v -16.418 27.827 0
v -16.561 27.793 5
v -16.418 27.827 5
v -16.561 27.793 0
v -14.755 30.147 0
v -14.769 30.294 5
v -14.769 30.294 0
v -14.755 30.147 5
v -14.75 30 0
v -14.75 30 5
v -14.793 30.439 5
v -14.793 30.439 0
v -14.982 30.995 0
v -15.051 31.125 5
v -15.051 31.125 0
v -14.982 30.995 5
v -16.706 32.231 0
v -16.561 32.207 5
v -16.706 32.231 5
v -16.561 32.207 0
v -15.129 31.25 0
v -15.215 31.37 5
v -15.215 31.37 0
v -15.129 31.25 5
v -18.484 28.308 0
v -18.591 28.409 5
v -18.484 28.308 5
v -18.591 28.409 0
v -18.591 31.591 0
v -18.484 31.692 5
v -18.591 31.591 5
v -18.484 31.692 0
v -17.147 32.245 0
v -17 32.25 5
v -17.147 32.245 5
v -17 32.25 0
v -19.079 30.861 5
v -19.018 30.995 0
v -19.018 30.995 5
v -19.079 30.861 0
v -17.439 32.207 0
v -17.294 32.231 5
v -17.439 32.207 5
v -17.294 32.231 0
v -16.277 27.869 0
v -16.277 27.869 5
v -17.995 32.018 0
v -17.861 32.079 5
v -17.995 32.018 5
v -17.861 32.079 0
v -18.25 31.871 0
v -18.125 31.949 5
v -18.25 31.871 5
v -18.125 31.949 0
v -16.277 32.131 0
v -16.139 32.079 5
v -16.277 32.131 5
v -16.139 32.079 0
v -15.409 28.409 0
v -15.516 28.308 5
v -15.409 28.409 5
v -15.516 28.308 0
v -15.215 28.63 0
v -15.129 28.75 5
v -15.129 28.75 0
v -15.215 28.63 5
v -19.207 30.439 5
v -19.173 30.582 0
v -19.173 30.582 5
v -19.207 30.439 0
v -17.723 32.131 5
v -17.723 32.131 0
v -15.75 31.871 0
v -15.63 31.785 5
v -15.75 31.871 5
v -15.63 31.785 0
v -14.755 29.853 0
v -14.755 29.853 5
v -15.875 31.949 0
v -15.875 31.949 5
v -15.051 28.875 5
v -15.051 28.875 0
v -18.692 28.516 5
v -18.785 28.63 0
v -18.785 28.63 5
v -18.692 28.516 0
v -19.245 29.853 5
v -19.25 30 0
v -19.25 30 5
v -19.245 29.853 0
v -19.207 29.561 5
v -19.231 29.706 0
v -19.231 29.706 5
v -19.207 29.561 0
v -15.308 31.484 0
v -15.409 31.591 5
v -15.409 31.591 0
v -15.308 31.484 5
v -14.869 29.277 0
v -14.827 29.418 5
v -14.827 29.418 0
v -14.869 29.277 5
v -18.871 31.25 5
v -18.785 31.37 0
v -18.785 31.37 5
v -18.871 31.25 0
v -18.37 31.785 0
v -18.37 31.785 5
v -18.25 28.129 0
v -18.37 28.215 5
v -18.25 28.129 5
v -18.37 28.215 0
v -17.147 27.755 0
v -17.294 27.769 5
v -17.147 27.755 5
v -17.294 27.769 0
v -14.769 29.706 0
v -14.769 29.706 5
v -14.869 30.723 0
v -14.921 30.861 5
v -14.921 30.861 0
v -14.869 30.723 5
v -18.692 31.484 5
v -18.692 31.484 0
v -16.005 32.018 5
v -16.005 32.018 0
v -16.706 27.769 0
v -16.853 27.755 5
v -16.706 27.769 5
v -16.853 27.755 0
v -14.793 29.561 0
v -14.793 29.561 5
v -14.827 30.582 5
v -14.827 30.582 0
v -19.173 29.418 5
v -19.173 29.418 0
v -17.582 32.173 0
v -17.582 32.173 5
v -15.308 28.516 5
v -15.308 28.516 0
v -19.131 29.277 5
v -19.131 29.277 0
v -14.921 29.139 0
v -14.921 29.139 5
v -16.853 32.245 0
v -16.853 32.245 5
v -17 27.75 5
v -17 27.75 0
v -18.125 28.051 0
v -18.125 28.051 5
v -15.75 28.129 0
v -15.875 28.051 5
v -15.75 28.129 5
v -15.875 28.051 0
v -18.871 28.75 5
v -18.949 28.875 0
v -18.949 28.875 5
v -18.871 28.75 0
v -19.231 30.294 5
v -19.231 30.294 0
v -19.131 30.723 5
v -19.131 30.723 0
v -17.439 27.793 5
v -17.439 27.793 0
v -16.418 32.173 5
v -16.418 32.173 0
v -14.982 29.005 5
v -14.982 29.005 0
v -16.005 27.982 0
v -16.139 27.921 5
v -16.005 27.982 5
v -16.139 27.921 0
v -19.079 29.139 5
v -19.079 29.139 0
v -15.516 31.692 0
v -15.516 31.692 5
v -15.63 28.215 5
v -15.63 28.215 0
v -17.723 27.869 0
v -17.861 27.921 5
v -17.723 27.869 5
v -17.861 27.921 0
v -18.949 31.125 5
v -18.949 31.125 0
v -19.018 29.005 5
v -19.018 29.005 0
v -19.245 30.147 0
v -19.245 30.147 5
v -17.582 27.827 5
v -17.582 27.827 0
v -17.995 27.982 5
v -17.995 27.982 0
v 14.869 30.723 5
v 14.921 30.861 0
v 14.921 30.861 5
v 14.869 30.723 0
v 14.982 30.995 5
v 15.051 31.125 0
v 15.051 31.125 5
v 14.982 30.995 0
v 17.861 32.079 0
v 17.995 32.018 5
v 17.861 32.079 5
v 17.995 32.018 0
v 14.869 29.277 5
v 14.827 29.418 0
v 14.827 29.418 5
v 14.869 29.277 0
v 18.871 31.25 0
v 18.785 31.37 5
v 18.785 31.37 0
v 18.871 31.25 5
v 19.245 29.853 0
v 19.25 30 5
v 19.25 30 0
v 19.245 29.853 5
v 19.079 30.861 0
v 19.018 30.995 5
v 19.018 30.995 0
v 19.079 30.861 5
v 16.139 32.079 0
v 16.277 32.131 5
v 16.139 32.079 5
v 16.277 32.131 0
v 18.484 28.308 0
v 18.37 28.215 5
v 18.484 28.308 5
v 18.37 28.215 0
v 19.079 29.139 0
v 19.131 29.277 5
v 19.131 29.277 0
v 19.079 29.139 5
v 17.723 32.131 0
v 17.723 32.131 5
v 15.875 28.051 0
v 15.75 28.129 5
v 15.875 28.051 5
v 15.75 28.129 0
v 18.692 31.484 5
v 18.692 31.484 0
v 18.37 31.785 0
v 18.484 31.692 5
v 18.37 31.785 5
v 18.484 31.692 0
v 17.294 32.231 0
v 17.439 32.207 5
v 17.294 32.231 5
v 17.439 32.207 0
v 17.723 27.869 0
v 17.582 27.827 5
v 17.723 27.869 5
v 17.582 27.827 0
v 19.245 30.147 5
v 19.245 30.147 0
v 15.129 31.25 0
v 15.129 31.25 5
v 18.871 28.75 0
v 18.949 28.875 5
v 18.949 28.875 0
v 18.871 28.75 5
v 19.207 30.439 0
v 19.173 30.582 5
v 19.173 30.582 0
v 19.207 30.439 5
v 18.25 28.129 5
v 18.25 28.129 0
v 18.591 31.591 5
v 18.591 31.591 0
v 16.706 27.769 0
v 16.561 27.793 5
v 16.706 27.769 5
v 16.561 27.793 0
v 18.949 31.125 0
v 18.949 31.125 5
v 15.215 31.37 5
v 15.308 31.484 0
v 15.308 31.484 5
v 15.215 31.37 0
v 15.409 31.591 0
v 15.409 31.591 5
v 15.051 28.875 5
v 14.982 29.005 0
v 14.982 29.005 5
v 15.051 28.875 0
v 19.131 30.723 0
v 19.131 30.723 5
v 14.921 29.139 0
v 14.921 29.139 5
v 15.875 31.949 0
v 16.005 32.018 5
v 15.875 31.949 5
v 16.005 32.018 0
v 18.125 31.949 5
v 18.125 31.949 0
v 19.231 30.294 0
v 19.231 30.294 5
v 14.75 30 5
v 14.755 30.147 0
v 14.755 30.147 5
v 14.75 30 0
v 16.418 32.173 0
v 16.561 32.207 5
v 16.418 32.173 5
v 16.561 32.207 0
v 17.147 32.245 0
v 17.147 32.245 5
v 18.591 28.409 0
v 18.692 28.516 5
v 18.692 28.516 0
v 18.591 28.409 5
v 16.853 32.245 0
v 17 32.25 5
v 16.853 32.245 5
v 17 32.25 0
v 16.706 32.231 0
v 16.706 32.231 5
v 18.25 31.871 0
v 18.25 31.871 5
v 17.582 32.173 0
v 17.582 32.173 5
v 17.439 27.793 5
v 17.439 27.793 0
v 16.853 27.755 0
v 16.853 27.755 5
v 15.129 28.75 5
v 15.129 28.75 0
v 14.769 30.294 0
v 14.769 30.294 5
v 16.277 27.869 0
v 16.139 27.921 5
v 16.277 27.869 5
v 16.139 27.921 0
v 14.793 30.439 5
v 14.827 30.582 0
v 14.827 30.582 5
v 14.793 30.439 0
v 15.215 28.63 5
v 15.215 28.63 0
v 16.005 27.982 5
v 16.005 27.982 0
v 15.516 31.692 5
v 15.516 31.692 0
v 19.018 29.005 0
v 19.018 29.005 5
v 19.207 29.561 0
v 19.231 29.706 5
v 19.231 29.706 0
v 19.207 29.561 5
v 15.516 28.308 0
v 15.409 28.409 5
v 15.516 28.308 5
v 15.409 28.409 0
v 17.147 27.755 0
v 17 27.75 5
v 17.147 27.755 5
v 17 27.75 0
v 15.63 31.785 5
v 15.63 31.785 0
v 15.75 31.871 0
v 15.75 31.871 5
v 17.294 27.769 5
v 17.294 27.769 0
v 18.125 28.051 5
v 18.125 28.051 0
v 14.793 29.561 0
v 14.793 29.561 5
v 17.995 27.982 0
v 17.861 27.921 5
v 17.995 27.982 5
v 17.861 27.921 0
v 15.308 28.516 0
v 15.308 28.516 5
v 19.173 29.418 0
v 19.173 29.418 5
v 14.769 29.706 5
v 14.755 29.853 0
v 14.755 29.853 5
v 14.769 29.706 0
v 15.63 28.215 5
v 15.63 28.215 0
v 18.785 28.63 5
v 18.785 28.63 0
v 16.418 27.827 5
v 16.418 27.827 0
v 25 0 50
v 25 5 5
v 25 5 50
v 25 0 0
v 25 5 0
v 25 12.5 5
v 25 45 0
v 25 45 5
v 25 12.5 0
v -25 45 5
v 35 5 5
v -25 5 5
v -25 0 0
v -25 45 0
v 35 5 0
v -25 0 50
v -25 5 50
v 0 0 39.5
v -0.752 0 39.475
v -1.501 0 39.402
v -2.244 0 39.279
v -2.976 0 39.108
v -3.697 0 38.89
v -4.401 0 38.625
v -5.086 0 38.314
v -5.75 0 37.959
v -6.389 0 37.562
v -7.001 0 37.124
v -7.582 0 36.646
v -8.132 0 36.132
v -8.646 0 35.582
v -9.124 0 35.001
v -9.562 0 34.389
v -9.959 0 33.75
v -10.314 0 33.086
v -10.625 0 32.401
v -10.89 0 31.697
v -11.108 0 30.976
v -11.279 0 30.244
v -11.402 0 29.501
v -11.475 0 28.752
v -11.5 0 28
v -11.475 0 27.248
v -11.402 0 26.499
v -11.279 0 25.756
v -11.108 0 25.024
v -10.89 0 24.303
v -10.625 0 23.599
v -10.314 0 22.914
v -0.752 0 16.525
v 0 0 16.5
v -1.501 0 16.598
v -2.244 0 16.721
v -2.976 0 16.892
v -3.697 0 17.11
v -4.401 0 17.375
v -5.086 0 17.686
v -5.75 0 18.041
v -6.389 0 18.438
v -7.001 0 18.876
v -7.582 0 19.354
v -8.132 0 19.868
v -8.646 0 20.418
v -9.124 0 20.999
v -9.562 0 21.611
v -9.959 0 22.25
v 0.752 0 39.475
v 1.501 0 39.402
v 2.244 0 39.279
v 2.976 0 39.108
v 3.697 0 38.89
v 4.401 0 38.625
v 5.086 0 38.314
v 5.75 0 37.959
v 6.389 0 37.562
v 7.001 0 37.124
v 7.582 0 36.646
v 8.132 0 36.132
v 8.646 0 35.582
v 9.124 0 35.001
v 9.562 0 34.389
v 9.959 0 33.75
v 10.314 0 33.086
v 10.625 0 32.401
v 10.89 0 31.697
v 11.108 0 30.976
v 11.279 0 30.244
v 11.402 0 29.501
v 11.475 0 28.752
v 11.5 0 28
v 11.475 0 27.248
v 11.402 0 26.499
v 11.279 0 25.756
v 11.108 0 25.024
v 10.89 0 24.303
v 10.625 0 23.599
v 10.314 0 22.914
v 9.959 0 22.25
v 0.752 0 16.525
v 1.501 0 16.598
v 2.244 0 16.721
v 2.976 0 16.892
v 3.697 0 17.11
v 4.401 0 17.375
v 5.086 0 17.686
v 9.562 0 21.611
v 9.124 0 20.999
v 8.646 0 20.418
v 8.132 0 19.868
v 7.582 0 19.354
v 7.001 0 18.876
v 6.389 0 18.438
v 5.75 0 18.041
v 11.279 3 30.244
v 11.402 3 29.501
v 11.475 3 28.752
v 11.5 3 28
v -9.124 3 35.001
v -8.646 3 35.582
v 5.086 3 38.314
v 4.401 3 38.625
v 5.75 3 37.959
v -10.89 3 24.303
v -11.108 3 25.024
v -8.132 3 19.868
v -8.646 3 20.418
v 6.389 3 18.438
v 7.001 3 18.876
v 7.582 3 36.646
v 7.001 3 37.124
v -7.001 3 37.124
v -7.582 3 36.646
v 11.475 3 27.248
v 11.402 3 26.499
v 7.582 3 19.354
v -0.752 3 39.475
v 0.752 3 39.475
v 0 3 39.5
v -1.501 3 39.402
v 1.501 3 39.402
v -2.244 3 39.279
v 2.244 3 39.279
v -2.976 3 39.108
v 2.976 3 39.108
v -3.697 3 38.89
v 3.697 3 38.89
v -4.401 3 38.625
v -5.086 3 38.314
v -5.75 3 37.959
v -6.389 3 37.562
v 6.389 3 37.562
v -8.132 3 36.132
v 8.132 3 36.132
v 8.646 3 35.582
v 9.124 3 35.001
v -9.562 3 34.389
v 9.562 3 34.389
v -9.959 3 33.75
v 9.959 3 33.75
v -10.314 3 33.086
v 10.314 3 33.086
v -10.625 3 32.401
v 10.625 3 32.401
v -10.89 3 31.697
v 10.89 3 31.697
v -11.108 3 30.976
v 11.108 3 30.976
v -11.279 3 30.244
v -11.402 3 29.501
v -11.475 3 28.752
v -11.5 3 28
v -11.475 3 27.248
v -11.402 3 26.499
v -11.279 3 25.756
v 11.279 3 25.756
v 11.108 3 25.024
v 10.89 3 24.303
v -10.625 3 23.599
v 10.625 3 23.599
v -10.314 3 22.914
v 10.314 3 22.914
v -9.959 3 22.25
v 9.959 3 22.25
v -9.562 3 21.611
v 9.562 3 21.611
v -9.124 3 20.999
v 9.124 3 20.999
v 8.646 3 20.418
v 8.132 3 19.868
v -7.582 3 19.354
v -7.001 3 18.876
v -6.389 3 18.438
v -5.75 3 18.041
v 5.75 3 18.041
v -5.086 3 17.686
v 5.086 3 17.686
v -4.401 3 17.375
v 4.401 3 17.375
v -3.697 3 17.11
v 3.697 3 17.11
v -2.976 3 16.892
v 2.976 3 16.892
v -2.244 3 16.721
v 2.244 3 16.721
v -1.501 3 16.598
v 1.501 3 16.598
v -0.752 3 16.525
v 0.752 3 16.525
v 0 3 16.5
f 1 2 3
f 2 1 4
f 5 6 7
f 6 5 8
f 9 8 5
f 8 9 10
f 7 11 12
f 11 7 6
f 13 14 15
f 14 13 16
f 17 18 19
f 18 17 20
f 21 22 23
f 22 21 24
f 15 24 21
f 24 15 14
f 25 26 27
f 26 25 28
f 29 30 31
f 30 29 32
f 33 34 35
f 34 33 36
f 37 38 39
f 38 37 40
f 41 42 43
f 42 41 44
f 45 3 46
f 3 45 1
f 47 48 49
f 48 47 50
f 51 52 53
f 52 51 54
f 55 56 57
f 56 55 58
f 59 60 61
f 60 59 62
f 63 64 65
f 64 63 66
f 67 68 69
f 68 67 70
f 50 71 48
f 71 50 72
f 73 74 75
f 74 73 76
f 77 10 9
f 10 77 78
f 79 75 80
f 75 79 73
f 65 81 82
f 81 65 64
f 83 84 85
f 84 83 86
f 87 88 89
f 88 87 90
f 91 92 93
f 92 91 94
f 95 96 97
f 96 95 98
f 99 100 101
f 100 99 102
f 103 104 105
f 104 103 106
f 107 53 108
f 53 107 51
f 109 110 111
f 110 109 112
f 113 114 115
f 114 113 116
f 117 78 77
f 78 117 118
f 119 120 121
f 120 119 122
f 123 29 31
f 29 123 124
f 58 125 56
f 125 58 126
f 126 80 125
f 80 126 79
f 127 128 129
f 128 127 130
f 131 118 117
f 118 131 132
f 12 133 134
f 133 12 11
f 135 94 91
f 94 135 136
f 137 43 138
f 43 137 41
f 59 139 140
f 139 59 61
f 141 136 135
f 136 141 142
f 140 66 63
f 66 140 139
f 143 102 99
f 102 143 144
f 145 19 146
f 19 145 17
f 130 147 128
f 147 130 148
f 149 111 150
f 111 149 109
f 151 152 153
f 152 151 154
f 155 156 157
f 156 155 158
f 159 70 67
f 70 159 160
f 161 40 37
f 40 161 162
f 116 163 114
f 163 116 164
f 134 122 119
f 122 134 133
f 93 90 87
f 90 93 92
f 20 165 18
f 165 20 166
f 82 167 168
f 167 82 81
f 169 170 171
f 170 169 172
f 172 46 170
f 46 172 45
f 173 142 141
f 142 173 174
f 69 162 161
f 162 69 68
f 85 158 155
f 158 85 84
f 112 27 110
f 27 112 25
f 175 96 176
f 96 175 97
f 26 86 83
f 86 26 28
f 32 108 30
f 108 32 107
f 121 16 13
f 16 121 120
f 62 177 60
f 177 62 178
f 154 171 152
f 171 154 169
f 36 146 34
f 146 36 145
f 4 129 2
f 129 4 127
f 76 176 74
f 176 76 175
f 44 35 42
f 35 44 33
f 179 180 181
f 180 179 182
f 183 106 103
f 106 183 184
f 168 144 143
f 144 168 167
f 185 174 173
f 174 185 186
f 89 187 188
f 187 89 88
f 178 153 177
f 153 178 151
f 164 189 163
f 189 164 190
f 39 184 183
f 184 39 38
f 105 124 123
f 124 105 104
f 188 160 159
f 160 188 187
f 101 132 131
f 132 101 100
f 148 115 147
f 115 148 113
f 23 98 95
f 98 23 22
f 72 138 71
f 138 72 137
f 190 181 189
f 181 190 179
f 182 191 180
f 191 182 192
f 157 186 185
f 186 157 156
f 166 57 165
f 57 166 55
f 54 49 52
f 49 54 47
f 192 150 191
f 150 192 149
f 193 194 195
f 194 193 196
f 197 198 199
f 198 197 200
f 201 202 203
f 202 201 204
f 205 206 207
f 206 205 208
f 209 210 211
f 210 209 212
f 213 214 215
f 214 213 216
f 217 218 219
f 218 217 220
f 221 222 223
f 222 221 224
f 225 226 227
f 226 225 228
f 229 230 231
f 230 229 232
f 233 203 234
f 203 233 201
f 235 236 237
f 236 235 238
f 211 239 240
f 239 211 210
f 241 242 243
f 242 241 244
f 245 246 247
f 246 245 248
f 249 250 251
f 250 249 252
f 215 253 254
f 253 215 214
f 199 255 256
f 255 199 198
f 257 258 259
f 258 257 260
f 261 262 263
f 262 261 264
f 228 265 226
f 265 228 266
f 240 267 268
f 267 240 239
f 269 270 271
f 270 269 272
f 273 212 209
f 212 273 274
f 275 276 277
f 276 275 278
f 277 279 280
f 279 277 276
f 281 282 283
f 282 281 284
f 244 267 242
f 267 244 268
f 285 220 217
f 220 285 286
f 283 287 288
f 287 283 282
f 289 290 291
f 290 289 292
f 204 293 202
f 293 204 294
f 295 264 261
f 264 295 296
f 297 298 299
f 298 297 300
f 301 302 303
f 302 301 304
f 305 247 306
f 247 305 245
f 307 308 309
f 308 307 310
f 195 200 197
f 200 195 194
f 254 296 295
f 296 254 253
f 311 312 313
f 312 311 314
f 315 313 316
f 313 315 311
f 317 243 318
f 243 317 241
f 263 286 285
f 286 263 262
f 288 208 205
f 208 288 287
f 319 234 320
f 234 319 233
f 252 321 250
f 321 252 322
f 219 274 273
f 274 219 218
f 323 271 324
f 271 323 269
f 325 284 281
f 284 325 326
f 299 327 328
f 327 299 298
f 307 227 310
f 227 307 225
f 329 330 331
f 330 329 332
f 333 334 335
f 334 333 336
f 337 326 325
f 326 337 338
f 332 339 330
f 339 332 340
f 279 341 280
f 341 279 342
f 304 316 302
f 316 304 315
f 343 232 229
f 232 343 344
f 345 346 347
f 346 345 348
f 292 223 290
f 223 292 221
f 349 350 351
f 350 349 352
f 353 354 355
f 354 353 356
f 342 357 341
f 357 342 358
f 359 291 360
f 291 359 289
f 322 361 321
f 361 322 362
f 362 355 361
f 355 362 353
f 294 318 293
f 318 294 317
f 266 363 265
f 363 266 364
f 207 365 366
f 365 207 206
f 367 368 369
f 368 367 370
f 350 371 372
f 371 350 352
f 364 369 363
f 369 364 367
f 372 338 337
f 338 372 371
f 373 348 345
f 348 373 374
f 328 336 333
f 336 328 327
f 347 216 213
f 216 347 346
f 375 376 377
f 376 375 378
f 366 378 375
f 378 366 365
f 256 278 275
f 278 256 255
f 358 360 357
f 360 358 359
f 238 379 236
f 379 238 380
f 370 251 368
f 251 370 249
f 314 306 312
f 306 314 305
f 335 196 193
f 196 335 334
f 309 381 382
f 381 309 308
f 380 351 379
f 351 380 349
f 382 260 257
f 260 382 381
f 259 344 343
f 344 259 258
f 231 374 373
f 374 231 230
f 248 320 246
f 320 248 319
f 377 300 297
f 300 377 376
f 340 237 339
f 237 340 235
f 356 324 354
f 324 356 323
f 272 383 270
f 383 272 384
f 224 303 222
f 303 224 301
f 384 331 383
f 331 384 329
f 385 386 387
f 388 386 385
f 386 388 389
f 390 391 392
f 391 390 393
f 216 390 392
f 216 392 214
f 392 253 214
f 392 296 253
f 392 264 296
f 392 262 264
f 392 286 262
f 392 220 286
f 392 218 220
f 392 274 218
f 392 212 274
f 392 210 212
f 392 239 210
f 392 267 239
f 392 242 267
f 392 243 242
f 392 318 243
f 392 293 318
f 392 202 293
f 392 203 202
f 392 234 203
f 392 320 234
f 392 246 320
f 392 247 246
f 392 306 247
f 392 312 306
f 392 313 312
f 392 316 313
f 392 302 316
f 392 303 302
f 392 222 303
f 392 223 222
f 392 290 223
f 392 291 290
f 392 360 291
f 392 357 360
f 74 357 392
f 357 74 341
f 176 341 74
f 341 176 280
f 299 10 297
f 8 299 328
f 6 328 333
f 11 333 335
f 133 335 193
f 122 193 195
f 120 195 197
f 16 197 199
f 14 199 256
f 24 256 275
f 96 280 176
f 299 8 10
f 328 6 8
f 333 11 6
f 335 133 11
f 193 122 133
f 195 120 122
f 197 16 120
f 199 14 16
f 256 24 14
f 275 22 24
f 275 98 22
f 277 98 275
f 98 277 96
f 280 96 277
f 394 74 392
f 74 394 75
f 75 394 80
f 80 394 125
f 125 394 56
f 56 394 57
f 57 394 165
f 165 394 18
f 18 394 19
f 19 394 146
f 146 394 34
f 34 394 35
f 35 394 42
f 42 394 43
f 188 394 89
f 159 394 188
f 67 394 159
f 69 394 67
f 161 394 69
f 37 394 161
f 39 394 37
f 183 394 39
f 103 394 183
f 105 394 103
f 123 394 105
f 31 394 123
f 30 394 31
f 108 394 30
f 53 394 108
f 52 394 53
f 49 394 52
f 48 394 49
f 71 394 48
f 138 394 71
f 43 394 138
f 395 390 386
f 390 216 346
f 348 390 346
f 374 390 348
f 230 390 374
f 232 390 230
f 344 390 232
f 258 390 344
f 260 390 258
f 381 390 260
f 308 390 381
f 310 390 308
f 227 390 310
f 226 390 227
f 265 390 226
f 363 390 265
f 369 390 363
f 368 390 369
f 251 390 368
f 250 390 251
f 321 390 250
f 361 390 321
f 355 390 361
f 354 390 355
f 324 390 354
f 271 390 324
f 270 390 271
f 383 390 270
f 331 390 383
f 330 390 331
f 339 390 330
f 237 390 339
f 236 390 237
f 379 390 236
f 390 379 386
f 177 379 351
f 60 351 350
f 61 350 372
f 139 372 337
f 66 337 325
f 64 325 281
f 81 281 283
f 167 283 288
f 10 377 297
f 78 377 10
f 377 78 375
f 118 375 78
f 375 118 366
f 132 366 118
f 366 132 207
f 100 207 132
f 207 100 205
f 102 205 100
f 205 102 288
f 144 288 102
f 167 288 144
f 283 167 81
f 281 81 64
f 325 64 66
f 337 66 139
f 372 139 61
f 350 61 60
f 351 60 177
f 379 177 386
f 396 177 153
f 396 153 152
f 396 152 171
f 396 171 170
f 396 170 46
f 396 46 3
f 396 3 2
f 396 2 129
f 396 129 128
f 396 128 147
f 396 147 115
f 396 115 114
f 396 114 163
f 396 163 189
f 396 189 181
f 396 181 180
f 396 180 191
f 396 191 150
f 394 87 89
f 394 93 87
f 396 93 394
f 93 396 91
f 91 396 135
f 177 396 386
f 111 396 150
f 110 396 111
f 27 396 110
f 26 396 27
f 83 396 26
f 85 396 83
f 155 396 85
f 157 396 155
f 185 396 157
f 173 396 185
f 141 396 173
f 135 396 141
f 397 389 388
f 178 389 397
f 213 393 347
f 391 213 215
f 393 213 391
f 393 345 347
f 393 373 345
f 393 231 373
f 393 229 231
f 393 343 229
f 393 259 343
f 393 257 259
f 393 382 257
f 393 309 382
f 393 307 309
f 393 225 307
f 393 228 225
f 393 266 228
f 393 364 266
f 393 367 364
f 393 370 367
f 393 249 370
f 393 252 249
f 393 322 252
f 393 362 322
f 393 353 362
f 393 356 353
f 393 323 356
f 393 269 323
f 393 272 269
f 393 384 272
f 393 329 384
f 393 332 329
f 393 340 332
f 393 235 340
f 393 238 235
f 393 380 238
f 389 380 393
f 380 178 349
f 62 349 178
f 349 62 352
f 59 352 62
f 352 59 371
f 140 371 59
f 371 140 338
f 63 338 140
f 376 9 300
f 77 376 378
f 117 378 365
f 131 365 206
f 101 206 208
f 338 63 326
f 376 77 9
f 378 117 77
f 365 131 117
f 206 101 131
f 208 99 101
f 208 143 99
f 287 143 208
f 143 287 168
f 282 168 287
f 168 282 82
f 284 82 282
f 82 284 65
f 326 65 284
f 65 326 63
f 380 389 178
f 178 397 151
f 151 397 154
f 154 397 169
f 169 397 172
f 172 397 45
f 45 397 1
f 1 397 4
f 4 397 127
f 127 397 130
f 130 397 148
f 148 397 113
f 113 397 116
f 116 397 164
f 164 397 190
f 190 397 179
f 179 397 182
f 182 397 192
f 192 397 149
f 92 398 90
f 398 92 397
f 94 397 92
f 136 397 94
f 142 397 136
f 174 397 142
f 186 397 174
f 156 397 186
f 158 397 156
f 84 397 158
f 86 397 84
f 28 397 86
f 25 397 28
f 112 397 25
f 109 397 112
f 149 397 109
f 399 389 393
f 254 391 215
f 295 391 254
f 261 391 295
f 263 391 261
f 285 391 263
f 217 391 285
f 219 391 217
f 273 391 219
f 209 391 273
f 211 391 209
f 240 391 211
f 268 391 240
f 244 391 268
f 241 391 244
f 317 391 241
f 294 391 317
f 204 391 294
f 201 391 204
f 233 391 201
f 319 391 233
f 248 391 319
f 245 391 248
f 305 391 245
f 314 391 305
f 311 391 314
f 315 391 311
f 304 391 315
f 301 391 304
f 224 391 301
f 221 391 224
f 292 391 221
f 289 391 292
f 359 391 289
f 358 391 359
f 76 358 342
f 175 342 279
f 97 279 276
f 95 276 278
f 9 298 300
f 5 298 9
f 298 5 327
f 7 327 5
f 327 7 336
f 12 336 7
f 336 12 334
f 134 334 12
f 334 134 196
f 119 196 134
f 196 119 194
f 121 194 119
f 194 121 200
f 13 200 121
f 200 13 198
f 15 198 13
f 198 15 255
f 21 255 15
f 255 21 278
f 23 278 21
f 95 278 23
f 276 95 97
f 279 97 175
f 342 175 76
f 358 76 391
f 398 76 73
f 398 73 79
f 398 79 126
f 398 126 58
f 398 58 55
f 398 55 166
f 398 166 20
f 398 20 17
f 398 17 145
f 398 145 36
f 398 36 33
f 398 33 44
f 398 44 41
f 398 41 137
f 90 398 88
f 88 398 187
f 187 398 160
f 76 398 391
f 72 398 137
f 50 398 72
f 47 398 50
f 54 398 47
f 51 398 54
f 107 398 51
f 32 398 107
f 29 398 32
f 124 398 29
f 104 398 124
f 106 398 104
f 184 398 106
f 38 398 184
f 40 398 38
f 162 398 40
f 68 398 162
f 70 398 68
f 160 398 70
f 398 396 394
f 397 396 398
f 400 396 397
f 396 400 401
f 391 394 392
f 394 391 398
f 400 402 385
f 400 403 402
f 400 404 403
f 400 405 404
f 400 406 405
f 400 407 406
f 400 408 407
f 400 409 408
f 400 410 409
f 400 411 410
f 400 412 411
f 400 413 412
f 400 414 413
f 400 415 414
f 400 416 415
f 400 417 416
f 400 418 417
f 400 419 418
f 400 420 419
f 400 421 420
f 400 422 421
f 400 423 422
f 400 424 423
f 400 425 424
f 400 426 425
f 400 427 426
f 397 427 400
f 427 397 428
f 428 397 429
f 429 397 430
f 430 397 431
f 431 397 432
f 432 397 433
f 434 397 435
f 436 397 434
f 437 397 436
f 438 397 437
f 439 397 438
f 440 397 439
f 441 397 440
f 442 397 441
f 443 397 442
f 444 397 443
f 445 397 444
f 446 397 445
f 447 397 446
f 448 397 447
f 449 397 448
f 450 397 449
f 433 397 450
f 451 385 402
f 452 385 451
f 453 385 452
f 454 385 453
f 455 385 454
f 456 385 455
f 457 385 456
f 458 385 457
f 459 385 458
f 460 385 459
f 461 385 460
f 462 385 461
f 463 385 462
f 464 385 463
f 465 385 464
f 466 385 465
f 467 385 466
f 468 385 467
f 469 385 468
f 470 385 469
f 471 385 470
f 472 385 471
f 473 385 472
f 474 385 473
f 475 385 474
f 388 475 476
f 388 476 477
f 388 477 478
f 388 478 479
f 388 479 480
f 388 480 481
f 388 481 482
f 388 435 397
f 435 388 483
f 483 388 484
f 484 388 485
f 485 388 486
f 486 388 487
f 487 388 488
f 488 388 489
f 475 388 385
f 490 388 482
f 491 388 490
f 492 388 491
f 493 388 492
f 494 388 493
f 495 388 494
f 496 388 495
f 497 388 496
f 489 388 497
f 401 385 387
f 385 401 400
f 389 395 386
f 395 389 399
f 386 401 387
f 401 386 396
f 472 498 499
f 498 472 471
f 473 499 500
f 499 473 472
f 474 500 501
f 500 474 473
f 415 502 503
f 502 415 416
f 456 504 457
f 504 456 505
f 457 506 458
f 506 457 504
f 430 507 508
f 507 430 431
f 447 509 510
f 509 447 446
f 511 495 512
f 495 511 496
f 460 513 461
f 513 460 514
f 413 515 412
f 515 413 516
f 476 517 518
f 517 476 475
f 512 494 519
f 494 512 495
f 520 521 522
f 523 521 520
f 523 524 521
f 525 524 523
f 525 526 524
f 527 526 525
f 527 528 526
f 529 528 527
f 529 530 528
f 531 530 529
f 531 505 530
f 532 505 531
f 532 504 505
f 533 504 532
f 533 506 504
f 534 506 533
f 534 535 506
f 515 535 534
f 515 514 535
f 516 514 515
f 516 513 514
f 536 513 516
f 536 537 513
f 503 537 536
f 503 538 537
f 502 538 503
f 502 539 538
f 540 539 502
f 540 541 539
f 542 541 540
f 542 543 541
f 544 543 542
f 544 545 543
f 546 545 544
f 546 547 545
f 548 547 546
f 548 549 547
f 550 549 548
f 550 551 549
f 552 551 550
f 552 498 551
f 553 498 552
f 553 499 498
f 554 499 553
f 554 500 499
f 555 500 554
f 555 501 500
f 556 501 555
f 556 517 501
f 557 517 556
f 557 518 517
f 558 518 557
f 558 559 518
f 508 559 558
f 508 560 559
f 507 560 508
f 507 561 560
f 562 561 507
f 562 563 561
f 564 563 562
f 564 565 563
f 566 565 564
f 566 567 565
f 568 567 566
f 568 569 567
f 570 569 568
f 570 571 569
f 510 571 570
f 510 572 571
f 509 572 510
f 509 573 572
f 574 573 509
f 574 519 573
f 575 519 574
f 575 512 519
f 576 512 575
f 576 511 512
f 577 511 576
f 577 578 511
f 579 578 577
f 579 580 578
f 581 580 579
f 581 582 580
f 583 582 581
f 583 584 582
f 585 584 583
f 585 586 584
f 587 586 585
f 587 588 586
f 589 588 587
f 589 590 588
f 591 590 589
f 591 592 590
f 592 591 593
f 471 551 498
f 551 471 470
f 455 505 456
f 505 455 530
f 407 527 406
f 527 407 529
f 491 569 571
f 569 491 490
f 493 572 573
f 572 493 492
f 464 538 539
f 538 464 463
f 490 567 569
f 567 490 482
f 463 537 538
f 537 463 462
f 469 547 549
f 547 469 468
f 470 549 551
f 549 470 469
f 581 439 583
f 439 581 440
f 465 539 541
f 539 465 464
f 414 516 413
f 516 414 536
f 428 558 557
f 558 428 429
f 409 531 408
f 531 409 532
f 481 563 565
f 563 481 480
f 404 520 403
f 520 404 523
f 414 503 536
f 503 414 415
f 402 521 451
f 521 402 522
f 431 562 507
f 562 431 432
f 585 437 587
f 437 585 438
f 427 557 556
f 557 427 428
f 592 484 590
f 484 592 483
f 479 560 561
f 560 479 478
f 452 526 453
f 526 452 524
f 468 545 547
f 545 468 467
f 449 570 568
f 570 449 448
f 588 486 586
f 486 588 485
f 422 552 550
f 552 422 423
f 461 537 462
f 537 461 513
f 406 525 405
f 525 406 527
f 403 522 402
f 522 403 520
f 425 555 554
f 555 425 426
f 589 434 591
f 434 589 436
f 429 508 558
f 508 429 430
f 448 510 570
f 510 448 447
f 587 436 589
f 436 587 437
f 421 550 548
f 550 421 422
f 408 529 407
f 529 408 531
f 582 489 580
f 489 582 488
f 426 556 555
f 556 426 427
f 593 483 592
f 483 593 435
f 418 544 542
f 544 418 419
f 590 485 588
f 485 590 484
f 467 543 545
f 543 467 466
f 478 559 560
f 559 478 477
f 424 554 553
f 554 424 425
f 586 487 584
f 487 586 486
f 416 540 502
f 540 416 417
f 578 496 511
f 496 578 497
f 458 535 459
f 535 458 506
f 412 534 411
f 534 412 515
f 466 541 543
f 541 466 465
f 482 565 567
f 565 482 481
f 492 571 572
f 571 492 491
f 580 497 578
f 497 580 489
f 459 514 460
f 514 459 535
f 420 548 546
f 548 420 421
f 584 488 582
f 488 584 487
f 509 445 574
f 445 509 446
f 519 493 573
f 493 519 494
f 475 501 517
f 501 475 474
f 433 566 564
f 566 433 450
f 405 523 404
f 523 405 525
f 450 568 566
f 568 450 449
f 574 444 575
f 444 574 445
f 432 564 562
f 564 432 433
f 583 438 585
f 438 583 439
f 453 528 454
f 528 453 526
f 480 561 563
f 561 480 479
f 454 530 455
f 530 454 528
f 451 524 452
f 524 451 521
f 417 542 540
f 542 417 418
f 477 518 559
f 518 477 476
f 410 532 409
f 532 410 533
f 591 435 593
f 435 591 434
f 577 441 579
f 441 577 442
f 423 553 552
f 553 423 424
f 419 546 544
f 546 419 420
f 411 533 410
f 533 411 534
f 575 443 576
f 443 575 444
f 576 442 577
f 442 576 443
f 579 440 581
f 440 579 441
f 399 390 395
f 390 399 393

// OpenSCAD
// L-shaped mounting bracket for NEMA 17 stepper motor (e.g. syringe pump)
// Print orientation: base plate on bed, vertical plate builds upward (+Z)

// ---------------- Parameters ----------------
plate_t      = 5;     // base plate thickness (Z)
base_x0      = -25;   // base plate left edge (X)
base_x1      = 25;    // base plate right edge (X)
base_y0      = 0;     // base plate front edge (Y)
base_y1      = 45;    // base plate back edge (Y)

motor_h      = 50;    // vertical motor plate height (Z)
motor_x0     = -25;   // motor plate left edge (X)
motor_x1     = 25;    // motor plate right edge (X)
motor_y0     = 0;     // motor plate front edge (Y)
motor_y1     = 5;     // motor plate back edge (Y)

boss_d       = 23;    // motor centring boss hole diameter
boss_x       = 0;     // boss hole centre X
boss_z       = 28;    // boss hole centre Z
boss_screw_d = 3.4;   // M3 screw holes diameter
boss_screw_n = 4;     // number of screw holes
boss_screw_a = 31;    // square pattern side length

gusset_t     = 5;     // gusset thickness (X)
gusset_y     = 20;    // gusset leg along +Y
gusset_z     = 20;    // gusset leg along +Z

eps          = 0.5;   // cutter overshoot past faces
$fn          = 96;    // curve resolution

// ---------------- Model ----------------
union() {
    // Base plate with two vertical through-holes (M4) at y = 30
    difference() {
        translate([base_x0, base_y0, 0])
            cube([base_x1 - base_x0, base_y1 - base_y0, plate_t]);
        for (sx = [-17, 17])
            translate([sx, base_y1 - 15, -eps])
                cylinder(d = 4.5, h = plate_t + 2 * eps);
    }

    // Vertical motor plate standing on the back edge of the base
    difference() {
        translate([motor_x0, motor_y0, 0])
            cube([motor_x1 - motor_x0, motor_y1 - motor_y0, motor_h]);
        // Boss hole along Y, centred at x = 0, z = 28
        translate([boss_x, 0, boss_z])
            rotate([90, 0, 0])
                cylinder(d = boss_d, h = motor_y1 - motor_y0 + 2 * eps, center = true);
        // M3 screw holes on a 31 mm square pattern, centred on the boss hole
        for (i = [0 : boss_screw_n - 1]) {
            a = boss_screw_a / sqrt(2);
            r = a / 2 * (i % 2 - 0.5);
            x = r * (i >= 2 ? -1 : 1);
            y = r * (i < 2 ? -1 : 1);
            translate([x, y, 0])
                rotate([0, 90, 0])
                    cylinder(d = boss_screw_d, h = motor_y1 - motor_y0 + 2 * eps, center = true);
        }
    }

    // Two triangular gussets flush with the left and right edges
    // Each is a right triangle in the YZ plane with legs 20 mm along +Y and +Z,
    // right-angle corner at y = 5, z = 5 (where the plates meet)
    for (side = [-1, 1]) {
        x0 = side < 0 ? base_x0 : base_x1 - gusset_t;
        translate([x0, 0, 0])
            linear_extrude(height = gusset_t * side)
                polygon([[-gusset_t * side, gusset_y], [-gusset_t * side, 5], [gusset_z - 5, 5]]);
    }
}
